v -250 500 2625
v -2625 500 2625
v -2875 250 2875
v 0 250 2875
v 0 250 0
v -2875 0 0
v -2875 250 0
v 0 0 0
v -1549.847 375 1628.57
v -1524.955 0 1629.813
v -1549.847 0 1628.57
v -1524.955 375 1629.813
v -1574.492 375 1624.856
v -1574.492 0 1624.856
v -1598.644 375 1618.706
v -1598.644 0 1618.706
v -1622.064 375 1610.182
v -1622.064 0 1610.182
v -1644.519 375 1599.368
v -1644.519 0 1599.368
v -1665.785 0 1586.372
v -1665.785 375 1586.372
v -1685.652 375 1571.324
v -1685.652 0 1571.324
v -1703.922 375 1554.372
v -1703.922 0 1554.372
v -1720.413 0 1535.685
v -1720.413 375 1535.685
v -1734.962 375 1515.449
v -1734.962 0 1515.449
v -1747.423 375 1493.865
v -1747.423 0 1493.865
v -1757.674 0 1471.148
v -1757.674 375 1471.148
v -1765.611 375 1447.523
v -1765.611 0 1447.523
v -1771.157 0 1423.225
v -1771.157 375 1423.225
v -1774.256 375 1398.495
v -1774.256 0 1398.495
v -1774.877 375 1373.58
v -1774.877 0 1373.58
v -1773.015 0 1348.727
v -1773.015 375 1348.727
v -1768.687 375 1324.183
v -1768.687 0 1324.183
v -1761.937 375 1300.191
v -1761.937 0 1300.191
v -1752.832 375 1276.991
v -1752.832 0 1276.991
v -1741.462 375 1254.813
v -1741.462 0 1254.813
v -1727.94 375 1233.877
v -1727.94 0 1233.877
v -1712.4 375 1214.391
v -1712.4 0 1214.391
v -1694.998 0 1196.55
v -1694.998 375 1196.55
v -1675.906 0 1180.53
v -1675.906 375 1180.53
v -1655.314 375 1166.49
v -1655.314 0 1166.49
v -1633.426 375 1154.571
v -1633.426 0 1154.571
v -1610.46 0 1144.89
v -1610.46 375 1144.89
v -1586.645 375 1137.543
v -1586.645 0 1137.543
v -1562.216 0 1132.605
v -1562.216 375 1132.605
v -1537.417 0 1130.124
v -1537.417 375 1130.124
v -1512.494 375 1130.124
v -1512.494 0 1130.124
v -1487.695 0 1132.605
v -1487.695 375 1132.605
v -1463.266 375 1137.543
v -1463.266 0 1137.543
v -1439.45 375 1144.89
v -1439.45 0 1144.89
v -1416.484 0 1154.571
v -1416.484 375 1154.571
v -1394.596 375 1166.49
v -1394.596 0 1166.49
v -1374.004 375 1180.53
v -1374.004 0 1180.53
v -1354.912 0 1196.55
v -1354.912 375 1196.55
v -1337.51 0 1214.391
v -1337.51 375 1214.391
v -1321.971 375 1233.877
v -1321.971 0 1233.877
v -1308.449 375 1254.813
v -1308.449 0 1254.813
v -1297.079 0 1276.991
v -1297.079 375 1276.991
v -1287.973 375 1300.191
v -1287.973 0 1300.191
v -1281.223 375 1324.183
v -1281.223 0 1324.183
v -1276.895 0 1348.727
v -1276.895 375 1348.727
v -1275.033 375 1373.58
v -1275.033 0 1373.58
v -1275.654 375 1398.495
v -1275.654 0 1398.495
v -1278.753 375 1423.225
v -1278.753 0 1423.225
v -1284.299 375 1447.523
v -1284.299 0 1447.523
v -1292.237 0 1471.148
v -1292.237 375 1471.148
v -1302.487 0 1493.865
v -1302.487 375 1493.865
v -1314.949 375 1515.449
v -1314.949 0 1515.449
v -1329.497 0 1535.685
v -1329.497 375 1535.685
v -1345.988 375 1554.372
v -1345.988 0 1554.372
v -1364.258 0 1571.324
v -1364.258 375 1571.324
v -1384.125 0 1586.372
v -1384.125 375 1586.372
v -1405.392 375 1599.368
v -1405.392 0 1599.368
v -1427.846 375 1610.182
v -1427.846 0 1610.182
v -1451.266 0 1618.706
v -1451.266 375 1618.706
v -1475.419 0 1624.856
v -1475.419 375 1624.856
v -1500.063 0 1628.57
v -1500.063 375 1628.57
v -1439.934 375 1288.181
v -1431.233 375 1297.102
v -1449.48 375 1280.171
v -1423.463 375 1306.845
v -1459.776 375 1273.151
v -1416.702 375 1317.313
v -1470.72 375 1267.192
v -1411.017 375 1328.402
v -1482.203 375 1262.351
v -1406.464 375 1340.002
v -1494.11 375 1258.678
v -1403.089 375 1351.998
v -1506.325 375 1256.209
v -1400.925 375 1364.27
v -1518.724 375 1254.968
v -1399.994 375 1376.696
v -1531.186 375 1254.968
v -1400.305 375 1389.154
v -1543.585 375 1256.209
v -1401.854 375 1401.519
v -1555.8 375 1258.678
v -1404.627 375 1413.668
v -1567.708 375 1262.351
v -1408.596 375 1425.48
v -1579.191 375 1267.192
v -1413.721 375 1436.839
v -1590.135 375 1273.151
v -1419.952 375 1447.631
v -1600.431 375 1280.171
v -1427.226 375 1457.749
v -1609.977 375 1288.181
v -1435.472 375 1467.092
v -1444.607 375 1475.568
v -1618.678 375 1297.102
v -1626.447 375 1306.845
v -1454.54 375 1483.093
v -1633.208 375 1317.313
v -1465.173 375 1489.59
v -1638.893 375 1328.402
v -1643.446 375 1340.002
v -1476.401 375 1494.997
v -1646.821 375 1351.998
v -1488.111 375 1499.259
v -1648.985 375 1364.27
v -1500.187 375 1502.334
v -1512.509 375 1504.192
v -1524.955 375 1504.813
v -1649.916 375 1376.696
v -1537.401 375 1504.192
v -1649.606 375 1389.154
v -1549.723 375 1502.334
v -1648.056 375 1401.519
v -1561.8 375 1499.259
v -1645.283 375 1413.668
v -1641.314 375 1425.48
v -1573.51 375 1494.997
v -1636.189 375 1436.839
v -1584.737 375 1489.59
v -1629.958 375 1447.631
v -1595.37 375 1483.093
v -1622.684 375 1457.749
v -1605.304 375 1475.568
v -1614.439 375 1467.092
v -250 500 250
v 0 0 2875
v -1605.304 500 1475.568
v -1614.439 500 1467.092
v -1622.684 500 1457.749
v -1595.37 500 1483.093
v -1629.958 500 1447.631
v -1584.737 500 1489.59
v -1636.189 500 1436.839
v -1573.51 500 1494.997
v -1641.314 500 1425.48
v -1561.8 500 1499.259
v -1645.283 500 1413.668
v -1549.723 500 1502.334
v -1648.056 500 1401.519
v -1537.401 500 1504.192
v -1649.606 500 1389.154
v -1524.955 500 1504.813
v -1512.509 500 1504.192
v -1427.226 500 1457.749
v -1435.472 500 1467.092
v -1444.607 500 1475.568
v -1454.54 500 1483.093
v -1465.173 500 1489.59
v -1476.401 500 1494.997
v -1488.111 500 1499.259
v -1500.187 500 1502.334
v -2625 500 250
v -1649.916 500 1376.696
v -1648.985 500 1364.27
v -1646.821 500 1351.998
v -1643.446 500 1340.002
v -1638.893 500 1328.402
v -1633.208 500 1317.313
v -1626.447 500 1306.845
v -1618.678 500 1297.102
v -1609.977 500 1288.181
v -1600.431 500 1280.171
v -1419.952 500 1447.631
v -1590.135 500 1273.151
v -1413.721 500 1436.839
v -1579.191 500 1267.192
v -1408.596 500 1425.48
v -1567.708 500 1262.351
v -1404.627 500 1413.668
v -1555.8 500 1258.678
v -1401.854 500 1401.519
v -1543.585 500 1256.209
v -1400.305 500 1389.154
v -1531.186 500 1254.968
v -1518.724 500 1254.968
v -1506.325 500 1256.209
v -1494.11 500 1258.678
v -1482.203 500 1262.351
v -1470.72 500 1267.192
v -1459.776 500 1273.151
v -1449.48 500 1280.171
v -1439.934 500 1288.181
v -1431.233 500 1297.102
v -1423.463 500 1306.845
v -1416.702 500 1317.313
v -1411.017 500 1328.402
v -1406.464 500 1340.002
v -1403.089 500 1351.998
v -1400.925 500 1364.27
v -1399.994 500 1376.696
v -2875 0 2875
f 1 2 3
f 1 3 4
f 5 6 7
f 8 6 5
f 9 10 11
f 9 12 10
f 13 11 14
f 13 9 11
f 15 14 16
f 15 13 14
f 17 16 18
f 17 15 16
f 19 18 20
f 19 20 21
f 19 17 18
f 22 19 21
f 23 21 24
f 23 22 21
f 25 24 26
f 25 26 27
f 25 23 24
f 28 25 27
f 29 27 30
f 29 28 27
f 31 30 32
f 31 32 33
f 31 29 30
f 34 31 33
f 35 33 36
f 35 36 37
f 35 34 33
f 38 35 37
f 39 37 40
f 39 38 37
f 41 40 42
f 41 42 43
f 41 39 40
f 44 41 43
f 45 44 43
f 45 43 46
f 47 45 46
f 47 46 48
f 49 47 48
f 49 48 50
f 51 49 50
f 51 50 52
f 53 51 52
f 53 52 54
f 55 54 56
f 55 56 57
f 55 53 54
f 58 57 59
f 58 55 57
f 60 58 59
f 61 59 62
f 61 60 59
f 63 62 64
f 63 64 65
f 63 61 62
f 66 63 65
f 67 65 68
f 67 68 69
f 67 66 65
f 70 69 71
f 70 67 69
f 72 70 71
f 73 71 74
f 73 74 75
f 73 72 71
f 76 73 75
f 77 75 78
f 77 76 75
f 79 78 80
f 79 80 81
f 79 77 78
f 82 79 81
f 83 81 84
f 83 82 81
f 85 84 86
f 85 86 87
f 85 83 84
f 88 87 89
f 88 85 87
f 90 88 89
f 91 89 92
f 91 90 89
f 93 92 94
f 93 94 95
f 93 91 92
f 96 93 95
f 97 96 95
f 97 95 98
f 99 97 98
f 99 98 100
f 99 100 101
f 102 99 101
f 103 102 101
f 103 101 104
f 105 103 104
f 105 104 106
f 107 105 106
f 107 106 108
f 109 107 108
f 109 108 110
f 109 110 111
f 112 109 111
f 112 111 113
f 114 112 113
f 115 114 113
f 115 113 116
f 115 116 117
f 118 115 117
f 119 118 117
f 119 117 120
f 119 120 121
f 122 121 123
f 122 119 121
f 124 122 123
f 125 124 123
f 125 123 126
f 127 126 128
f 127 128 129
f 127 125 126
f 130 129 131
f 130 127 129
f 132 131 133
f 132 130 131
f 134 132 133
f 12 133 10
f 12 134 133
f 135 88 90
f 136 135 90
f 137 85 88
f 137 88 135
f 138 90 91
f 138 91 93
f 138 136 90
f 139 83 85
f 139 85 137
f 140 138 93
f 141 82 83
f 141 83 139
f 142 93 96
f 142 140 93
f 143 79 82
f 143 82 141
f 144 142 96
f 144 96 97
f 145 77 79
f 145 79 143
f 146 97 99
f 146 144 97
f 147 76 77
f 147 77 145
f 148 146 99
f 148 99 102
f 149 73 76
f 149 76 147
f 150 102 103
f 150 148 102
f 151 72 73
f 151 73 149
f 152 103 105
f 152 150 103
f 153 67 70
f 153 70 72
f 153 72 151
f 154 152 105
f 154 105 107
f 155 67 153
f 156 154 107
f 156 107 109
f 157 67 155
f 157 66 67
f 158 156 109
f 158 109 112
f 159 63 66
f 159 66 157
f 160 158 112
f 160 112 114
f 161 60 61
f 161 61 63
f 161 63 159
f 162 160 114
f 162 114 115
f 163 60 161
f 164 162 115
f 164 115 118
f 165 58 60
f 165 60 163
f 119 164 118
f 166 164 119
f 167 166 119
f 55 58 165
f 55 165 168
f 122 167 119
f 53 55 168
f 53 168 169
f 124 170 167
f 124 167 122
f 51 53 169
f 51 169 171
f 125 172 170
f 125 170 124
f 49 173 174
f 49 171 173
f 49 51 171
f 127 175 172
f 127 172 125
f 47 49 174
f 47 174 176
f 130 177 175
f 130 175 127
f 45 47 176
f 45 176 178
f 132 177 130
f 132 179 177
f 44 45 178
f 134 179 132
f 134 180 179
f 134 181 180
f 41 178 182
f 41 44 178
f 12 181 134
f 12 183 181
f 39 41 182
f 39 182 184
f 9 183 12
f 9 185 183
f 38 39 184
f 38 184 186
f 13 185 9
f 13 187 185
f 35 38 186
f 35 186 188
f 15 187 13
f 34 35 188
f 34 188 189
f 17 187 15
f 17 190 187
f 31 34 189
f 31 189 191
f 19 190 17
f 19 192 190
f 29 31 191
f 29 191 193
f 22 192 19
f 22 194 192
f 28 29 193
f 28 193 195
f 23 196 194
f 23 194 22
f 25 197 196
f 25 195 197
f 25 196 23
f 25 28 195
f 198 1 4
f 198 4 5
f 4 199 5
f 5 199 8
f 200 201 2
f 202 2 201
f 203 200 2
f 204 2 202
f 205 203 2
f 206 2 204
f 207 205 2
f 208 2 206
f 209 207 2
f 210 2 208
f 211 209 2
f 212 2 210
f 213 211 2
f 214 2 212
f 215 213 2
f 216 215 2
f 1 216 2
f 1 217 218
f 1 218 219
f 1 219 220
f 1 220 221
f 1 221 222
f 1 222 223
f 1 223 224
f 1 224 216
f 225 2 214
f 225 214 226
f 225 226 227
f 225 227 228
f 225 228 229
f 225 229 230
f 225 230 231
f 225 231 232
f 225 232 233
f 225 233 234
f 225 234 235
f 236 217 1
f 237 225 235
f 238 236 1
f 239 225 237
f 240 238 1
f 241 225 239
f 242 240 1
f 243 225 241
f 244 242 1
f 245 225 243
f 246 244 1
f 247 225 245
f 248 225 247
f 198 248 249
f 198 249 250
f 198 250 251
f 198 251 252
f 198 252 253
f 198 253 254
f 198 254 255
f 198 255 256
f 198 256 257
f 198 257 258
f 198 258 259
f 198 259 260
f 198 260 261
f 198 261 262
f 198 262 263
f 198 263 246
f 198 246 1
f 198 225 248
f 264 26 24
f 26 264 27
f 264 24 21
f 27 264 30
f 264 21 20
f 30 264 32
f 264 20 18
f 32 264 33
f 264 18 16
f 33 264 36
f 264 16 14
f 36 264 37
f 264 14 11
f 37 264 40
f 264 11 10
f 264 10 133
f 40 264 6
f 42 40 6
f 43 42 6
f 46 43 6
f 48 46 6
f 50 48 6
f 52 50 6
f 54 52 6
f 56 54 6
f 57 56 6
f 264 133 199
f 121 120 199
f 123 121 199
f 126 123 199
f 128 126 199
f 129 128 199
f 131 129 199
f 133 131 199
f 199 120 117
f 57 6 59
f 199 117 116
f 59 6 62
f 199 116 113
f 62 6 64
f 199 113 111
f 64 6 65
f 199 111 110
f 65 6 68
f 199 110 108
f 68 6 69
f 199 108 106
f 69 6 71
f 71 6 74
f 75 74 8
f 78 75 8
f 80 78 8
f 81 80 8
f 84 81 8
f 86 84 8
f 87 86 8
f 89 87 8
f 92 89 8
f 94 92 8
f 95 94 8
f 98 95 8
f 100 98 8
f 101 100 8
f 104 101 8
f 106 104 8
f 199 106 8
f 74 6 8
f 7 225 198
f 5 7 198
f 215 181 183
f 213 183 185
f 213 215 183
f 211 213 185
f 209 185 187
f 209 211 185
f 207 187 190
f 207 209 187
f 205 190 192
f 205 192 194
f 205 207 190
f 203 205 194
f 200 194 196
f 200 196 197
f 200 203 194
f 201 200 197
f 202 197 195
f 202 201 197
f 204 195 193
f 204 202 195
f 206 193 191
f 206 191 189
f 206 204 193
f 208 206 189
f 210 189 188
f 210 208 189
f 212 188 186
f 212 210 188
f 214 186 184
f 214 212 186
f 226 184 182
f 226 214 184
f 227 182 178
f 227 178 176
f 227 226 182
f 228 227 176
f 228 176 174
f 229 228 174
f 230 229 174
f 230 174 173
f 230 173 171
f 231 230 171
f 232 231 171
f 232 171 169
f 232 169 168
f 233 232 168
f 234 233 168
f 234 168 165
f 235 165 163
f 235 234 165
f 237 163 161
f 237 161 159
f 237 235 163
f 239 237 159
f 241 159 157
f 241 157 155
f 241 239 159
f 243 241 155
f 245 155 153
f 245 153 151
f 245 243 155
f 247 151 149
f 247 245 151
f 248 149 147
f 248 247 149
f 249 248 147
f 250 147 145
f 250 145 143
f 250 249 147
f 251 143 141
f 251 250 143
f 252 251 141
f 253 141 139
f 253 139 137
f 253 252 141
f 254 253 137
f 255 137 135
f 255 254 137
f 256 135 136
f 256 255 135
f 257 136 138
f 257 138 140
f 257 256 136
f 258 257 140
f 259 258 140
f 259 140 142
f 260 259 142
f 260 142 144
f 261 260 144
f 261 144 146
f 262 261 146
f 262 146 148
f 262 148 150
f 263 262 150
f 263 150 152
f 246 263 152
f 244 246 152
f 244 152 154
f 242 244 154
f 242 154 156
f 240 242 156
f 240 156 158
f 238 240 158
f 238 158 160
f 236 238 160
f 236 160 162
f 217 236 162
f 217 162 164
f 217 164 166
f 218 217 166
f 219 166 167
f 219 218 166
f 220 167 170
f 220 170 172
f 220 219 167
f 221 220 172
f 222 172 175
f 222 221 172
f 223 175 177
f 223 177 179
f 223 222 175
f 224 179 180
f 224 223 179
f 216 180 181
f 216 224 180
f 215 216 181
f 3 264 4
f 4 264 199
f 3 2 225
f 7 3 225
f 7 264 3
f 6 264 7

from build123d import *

# Parameters (mm, degrees)
SKETCH1_W           = 2875
SKETCH1_H           = 2875
BOSS_EXTRUDE1_DEPTH = 500
CHAMFER1_SIZE       = 250


with BuildPart() as part:
    # Sketch1 → Boss-Extrude1 (new body)
    with BuildSketch(Plane(origin=(0, 0, 0), x_dir=(1, 0, 0), z_dir=(0, 1, 0))):
        with Locations((-1437.5, -1437.5)):
            Rectangle(SKETCH1_W, SKETCH1_H)
    extrude(amount=BOSS_EXTRUDE1_DEPTH)

    # Chamfer1
    chamfer1_edges = [part.edges().sort_by_distance(p)[0] for p in [
        (-1437.5, 500, 0),
        (0, 500, 1437.5),
        (-1437.5, 500, 2875),
        (-2875, 500, 1437.5),
    ]]
    chamfer(chamfer1_edges, length=CHAMFER1_SIZE)

    # Sketch6 → Hole2 (revolve, cut)
    with BuildSketch(Plane(origin=(-1524.955171355, 500, 1379.812775197), x_dir=(0, 0, 1), z_dir=(1, 0, 0))):
        Polygon((0, 0), (0, 500), (250, 500), (250, 125), (125, 125), (125, 0), align=None)
    revolve(axis=Axis((-1524.955171355, 506.35, 1379.812775197), (0, -1, 0)), mode=Mode.SUBTRACT)


solid = part.part
